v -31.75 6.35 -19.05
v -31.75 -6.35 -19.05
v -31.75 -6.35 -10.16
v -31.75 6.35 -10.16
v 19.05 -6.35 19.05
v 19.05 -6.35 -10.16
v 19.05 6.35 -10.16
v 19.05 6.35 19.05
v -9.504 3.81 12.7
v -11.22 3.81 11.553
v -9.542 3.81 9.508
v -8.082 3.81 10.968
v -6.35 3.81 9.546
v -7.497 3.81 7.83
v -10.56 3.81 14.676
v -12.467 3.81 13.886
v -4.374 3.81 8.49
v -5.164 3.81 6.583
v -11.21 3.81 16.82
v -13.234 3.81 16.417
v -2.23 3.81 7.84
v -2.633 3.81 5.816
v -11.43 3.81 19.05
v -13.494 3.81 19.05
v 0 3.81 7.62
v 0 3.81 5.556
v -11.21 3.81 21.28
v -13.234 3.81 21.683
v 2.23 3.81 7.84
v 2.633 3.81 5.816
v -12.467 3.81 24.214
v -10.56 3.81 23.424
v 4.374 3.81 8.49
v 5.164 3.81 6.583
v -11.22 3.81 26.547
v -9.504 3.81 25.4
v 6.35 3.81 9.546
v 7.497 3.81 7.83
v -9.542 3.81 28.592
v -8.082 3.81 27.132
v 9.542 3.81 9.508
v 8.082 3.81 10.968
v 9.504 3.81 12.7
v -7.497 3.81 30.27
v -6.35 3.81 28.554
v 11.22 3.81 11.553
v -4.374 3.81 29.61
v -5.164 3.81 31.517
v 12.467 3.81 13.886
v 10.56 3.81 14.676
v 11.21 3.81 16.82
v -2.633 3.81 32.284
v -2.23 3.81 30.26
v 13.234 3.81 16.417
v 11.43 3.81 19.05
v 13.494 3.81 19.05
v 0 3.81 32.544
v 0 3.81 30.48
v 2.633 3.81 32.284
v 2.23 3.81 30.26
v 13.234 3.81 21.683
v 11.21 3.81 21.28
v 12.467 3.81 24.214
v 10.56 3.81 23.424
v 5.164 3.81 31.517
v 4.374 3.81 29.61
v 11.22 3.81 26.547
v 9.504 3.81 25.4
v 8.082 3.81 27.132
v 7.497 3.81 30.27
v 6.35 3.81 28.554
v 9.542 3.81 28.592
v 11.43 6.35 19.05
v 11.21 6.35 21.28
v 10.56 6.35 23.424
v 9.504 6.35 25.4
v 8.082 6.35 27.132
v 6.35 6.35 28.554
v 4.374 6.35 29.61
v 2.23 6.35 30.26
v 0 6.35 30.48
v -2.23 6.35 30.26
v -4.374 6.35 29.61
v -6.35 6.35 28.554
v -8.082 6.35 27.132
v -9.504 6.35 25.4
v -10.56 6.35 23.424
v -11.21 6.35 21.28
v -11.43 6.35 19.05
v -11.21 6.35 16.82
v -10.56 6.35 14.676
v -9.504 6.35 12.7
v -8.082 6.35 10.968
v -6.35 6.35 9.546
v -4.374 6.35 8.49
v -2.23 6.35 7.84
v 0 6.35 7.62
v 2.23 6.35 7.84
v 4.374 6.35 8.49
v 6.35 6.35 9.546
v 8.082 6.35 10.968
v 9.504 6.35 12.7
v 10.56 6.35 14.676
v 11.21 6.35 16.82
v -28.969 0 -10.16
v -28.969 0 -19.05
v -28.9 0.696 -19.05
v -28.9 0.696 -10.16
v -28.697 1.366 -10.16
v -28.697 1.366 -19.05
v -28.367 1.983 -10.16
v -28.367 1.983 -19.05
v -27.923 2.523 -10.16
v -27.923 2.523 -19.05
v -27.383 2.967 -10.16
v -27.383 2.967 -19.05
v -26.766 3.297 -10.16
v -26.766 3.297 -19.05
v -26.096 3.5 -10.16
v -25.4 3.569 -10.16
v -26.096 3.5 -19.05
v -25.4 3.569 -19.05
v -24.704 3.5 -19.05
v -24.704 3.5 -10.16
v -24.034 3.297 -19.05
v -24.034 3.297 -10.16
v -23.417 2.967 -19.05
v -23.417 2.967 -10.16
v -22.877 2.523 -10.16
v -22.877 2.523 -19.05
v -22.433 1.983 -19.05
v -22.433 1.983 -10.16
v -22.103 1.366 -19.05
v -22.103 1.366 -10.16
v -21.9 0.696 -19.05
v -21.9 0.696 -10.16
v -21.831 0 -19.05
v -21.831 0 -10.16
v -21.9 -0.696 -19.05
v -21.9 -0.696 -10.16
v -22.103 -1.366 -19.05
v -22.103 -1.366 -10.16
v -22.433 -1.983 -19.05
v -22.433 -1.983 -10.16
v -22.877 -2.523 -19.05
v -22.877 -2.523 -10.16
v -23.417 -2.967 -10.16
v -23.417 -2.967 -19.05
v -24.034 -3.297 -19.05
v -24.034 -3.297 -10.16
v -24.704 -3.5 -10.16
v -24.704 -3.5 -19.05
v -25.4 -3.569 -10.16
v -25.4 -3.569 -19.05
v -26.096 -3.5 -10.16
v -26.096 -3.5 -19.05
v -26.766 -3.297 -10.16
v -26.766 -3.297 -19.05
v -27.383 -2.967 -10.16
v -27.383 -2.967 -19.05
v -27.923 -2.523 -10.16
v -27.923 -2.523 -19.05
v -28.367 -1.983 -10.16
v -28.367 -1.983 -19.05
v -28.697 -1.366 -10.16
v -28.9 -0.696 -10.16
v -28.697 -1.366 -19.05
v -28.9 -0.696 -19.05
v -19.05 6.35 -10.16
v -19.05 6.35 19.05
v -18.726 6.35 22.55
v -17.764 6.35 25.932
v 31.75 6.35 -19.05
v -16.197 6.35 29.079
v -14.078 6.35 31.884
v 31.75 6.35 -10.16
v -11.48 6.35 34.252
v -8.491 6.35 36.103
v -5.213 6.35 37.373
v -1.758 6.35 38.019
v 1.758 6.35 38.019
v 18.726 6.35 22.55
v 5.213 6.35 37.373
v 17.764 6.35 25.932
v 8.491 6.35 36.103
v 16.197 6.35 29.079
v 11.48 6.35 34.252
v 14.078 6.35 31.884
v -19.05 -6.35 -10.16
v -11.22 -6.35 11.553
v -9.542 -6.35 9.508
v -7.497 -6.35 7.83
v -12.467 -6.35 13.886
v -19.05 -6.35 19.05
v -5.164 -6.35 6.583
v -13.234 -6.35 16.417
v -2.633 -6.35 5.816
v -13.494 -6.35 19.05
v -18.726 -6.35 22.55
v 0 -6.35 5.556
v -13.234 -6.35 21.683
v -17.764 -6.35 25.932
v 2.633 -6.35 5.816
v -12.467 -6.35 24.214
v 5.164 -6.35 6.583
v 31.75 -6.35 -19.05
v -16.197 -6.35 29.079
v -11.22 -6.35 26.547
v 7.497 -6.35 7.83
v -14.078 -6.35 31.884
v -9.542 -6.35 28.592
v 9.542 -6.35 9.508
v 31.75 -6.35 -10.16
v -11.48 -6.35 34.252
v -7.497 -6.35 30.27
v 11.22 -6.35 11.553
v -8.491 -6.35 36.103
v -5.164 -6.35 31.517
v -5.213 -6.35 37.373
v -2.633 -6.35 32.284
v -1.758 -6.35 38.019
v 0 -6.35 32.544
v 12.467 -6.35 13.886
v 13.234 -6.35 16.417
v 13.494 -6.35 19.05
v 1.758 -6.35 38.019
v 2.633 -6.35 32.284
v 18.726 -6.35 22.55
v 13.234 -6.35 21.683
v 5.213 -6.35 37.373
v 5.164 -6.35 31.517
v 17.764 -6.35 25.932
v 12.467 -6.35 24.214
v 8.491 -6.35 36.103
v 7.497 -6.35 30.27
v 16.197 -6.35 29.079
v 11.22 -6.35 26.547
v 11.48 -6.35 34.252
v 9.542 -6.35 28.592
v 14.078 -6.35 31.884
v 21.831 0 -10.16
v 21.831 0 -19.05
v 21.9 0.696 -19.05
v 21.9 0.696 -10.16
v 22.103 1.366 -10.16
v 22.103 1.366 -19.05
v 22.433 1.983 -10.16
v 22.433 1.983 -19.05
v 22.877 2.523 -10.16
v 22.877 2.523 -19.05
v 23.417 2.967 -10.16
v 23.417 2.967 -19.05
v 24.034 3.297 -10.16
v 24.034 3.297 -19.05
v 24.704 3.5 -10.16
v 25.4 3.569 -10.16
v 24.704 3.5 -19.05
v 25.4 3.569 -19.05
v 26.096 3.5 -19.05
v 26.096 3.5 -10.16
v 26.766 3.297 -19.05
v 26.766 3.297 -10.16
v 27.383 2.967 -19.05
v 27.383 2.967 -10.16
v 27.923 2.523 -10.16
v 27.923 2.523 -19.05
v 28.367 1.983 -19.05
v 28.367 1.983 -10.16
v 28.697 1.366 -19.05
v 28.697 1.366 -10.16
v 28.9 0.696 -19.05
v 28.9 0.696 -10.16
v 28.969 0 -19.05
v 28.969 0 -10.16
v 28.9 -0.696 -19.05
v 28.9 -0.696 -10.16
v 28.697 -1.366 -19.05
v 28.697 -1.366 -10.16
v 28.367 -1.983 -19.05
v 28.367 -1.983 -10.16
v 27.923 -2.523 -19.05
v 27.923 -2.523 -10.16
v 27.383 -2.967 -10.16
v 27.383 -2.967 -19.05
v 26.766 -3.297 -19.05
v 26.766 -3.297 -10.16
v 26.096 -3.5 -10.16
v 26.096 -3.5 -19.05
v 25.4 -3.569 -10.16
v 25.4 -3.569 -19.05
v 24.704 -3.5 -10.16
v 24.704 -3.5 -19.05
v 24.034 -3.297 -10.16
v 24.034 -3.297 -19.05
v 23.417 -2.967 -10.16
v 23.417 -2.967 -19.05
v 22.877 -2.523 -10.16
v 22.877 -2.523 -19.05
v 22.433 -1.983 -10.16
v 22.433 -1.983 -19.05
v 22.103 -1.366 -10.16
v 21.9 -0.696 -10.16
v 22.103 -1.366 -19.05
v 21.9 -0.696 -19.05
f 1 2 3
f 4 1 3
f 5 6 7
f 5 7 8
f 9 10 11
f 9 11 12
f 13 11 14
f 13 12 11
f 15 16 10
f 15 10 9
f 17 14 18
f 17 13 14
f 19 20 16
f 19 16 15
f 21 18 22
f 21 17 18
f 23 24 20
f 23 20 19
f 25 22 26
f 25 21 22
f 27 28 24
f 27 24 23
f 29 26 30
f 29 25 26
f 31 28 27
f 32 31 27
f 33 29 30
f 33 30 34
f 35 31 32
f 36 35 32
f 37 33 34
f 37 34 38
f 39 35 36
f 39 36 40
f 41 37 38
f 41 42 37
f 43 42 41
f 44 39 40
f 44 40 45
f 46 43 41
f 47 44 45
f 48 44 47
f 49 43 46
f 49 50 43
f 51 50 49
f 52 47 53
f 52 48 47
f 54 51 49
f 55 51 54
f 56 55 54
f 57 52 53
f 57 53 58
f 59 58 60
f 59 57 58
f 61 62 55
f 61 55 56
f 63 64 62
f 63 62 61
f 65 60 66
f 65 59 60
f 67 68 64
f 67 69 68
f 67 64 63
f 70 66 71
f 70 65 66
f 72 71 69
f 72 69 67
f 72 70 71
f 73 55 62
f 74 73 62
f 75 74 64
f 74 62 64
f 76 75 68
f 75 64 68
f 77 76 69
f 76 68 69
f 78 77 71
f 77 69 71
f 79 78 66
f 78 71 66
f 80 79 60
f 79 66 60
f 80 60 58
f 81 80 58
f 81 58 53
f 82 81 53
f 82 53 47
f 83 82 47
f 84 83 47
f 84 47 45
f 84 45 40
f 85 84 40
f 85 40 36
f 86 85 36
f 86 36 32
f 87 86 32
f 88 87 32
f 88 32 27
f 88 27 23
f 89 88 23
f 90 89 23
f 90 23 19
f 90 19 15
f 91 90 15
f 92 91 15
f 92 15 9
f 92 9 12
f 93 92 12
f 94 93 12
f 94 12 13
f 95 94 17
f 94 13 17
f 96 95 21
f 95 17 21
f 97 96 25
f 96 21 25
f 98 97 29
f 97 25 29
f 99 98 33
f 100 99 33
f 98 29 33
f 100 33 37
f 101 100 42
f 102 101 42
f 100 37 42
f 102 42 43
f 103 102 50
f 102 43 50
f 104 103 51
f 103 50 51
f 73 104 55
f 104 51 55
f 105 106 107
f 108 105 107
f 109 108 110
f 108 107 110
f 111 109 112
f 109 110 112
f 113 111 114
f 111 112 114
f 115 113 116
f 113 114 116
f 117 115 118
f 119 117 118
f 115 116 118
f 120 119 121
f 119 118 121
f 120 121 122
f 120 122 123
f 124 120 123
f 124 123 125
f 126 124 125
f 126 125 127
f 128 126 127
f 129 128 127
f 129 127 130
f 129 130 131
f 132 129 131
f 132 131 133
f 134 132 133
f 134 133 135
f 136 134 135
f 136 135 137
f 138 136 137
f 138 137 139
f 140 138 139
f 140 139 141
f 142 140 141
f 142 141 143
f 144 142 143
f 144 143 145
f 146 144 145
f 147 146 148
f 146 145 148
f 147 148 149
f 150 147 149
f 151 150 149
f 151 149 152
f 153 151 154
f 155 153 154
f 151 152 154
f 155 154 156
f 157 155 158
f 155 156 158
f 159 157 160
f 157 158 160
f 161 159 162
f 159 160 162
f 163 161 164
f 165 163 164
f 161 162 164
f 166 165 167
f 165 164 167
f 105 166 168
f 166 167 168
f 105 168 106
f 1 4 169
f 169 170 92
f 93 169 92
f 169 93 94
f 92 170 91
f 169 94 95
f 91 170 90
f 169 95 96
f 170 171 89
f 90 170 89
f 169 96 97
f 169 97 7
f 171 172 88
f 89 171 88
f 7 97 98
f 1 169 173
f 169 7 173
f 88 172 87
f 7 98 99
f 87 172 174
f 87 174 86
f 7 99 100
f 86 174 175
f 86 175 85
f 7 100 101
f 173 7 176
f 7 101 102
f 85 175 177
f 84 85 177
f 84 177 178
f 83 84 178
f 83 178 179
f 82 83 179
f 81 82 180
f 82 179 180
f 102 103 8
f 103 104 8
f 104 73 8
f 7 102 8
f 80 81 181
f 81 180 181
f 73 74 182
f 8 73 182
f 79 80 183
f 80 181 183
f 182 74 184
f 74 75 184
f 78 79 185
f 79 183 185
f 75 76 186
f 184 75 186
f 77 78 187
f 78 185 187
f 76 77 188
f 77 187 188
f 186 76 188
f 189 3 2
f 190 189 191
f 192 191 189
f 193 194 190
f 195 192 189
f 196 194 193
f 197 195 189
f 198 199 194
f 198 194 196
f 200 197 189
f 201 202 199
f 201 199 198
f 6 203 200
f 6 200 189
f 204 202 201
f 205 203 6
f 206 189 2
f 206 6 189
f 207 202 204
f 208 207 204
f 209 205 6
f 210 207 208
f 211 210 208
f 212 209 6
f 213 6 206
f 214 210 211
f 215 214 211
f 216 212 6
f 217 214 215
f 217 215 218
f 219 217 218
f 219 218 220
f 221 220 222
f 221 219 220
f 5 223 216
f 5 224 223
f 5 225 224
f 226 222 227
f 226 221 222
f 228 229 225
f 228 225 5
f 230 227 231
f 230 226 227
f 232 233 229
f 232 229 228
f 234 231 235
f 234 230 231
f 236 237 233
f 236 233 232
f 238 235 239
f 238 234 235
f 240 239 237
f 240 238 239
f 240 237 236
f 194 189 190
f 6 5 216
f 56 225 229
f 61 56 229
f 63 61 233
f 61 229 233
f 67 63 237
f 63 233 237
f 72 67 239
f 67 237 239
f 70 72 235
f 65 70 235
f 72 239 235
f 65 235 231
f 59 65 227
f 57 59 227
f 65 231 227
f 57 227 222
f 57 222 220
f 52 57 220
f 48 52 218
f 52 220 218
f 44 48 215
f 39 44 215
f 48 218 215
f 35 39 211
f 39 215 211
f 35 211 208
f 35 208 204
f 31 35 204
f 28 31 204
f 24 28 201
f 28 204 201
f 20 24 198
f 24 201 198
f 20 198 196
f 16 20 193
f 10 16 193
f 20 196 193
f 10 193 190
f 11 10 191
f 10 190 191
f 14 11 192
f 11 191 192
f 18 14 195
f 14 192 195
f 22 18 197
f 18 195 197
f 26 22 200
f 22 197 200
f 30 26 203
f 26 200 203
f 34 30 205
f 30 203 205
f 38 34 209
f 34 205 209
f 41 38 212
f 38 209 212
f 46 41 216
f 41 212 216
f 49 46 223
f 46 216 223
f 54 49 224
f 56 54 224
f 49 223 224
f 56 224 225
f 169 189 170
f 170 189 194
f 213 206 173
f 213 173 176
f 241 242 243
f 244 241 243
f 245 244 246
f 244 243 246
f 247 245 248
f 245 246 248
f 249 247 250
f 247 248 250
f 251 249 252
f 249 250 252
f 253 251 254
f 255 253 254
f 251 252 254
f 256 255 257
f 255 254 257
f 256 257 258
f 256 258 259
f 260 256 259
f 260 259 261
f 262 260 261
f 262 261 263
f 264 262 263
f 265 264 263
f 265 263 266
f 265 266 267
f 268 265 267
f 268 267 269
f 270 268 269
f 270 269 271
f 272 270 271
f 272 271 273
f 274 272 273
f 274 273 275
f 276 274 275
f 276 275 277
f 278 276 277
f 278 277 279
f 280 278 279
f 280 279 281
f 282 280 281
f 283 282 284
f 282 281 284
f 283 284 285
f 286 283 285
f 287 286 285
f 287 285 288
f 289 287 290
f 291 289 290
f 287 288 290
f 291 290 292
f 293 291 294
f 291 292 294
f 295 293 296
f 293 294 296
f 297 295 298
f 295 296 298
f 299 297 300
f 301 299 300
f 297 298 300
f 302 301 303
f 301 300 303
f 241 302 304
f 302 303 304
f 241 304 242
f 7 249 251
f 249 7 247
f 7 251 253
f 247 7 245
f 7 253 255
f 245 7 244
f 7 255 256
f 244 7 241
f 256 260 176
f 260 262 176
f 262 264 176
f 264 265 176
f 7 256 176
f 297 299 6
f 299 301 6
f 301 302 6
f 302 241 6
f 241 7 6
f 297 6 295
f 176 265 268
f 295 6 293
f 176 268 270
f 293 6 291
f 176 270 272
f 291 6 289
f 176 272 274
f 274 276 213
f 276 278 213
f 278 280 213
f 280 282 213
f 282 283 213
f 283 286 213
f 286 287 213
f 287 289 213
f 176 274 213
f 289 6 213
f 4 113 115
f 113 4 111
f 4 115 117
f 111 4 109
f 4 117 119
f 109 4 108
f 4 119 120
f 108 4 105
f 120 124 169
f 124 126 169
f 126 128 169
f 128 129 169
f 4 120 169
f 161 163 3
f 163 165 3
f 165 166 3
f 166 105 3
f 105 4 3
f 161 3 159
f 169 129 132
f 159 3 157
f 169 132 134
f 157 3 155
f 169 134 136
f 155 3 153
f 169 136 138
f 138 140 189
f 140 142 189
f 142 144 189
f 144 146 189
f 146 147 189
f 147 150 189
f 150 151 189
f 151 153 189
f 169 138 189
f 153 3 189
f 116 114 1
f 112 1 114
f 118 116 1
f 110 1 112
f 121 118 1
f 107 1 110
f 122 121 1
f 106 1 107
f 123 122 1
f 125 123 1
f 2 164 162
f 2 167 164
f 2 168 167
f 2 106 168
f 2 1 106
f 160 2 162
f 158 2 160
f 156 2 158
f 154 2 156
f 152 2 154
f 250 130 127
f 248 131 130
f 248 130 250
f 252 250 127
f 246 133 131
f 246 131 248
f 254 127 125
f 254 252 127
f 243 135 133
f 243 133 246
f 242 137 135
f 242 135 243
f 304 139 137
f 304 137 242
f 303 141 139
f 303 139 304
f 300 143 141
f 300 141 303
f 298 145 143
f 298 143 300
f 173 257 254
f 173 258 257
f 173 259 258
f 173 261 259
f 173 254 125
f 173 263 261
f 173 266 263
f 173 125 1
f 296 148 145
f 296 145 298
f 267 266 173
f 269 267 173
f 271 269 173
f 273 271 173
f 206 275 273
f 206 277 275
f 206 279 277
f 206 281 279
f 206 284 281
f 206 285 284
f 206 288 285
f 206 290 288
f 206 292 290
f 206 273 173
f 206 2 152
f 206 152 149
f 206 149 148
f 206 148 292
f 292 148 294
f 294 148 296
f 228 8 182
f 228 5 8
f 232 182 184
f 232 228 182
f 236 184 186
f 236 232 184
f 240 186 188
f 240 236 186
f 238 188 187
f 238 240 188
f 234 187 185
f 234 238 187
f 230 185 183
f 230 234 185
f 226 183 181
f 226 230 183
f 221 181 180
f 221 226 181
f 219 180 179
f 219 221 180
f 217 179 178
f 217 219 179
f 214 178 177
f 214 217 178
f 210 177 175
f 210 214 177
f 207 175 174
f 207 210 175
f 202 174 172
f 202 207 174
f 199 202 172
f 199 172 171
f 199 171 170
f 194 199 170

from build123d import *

# Parameters (mm, degrees)
F0_W          = 63.5
F0_H          = 38.1
F1_DEPTH      = 6.35
F2_W          = 12.7
F2_H          = 29.21
F3_DEPTH      = 12.701
F5_DEPTH      = 6.35
F5_DEPTH_BACK = 6.35
F6_R          = 13.49375
F7_DEPTH      = 10.16
F8_R          = 11.43
F9_DEPTH      = 25.4
F11_D         = 7.1374


with BuildPart() as f1:
    # F0 (on Front) → F1 (new body, symmetric)
    with BuildSketch(Plane.XZ):
        Rectangle(F0_W, F0_H)
    extrude(amount=F1_DEPTH, both=True)

    # F2 (on face) → F3 (cut, through all)
    with BuildSketch(Plane.XZ.offset(6.35)):
        with Locations((-25.4, 4.445)):
            Rectangle(F2_W, F2_H)
        with Locations((25.4, 4.445)):
            Rectangle(F2_W, F2_H)
    extrude(amount=-F3_DEPTH, mode=Mode.SUBTRACT)

    # F4 (on Front) → F5 (join, two sides)
    with BuildSketch(Plane.XZ) as f5_sk:
        with BuildLine():
            Line((-19.05, 19.05), (19.05, 19.05))
            ThreePointArc((19.05, 19.05), (0, 38.1), (-19.05, 19.05))
        make_face()
    extrude(amount=F5_DEPTH)
    extrude(f5_sk.sketch, amount=-F5_DEPTH_BACK)

    # F6 (on face) → F7 (cut)
    with BuildSketch(Plane.XZ.offset(6.35)):
        with Locations((0, 19.05)):
            Circle(F6_R)
    extrude(amount=-F7_DEPTH, mode=Mode.SUBTRACT)

    # F8 (on face) → F9 (cut)
    with BuildSketch(Plane.XZ.offset(-3.81)):
        with Locations((0, 19.05)):
            Circle(F8_R)
    extrude(amount=-F9_DEPTH, mode=Mode.SUBTRACT)

    # F11 (through all)
    with Locations(Plane.XY.offset(-10.16)):
        with Locations((-25.4, 0), (25.4, 0)):
            Hole(F11_D / 2)


solid = f1.part
